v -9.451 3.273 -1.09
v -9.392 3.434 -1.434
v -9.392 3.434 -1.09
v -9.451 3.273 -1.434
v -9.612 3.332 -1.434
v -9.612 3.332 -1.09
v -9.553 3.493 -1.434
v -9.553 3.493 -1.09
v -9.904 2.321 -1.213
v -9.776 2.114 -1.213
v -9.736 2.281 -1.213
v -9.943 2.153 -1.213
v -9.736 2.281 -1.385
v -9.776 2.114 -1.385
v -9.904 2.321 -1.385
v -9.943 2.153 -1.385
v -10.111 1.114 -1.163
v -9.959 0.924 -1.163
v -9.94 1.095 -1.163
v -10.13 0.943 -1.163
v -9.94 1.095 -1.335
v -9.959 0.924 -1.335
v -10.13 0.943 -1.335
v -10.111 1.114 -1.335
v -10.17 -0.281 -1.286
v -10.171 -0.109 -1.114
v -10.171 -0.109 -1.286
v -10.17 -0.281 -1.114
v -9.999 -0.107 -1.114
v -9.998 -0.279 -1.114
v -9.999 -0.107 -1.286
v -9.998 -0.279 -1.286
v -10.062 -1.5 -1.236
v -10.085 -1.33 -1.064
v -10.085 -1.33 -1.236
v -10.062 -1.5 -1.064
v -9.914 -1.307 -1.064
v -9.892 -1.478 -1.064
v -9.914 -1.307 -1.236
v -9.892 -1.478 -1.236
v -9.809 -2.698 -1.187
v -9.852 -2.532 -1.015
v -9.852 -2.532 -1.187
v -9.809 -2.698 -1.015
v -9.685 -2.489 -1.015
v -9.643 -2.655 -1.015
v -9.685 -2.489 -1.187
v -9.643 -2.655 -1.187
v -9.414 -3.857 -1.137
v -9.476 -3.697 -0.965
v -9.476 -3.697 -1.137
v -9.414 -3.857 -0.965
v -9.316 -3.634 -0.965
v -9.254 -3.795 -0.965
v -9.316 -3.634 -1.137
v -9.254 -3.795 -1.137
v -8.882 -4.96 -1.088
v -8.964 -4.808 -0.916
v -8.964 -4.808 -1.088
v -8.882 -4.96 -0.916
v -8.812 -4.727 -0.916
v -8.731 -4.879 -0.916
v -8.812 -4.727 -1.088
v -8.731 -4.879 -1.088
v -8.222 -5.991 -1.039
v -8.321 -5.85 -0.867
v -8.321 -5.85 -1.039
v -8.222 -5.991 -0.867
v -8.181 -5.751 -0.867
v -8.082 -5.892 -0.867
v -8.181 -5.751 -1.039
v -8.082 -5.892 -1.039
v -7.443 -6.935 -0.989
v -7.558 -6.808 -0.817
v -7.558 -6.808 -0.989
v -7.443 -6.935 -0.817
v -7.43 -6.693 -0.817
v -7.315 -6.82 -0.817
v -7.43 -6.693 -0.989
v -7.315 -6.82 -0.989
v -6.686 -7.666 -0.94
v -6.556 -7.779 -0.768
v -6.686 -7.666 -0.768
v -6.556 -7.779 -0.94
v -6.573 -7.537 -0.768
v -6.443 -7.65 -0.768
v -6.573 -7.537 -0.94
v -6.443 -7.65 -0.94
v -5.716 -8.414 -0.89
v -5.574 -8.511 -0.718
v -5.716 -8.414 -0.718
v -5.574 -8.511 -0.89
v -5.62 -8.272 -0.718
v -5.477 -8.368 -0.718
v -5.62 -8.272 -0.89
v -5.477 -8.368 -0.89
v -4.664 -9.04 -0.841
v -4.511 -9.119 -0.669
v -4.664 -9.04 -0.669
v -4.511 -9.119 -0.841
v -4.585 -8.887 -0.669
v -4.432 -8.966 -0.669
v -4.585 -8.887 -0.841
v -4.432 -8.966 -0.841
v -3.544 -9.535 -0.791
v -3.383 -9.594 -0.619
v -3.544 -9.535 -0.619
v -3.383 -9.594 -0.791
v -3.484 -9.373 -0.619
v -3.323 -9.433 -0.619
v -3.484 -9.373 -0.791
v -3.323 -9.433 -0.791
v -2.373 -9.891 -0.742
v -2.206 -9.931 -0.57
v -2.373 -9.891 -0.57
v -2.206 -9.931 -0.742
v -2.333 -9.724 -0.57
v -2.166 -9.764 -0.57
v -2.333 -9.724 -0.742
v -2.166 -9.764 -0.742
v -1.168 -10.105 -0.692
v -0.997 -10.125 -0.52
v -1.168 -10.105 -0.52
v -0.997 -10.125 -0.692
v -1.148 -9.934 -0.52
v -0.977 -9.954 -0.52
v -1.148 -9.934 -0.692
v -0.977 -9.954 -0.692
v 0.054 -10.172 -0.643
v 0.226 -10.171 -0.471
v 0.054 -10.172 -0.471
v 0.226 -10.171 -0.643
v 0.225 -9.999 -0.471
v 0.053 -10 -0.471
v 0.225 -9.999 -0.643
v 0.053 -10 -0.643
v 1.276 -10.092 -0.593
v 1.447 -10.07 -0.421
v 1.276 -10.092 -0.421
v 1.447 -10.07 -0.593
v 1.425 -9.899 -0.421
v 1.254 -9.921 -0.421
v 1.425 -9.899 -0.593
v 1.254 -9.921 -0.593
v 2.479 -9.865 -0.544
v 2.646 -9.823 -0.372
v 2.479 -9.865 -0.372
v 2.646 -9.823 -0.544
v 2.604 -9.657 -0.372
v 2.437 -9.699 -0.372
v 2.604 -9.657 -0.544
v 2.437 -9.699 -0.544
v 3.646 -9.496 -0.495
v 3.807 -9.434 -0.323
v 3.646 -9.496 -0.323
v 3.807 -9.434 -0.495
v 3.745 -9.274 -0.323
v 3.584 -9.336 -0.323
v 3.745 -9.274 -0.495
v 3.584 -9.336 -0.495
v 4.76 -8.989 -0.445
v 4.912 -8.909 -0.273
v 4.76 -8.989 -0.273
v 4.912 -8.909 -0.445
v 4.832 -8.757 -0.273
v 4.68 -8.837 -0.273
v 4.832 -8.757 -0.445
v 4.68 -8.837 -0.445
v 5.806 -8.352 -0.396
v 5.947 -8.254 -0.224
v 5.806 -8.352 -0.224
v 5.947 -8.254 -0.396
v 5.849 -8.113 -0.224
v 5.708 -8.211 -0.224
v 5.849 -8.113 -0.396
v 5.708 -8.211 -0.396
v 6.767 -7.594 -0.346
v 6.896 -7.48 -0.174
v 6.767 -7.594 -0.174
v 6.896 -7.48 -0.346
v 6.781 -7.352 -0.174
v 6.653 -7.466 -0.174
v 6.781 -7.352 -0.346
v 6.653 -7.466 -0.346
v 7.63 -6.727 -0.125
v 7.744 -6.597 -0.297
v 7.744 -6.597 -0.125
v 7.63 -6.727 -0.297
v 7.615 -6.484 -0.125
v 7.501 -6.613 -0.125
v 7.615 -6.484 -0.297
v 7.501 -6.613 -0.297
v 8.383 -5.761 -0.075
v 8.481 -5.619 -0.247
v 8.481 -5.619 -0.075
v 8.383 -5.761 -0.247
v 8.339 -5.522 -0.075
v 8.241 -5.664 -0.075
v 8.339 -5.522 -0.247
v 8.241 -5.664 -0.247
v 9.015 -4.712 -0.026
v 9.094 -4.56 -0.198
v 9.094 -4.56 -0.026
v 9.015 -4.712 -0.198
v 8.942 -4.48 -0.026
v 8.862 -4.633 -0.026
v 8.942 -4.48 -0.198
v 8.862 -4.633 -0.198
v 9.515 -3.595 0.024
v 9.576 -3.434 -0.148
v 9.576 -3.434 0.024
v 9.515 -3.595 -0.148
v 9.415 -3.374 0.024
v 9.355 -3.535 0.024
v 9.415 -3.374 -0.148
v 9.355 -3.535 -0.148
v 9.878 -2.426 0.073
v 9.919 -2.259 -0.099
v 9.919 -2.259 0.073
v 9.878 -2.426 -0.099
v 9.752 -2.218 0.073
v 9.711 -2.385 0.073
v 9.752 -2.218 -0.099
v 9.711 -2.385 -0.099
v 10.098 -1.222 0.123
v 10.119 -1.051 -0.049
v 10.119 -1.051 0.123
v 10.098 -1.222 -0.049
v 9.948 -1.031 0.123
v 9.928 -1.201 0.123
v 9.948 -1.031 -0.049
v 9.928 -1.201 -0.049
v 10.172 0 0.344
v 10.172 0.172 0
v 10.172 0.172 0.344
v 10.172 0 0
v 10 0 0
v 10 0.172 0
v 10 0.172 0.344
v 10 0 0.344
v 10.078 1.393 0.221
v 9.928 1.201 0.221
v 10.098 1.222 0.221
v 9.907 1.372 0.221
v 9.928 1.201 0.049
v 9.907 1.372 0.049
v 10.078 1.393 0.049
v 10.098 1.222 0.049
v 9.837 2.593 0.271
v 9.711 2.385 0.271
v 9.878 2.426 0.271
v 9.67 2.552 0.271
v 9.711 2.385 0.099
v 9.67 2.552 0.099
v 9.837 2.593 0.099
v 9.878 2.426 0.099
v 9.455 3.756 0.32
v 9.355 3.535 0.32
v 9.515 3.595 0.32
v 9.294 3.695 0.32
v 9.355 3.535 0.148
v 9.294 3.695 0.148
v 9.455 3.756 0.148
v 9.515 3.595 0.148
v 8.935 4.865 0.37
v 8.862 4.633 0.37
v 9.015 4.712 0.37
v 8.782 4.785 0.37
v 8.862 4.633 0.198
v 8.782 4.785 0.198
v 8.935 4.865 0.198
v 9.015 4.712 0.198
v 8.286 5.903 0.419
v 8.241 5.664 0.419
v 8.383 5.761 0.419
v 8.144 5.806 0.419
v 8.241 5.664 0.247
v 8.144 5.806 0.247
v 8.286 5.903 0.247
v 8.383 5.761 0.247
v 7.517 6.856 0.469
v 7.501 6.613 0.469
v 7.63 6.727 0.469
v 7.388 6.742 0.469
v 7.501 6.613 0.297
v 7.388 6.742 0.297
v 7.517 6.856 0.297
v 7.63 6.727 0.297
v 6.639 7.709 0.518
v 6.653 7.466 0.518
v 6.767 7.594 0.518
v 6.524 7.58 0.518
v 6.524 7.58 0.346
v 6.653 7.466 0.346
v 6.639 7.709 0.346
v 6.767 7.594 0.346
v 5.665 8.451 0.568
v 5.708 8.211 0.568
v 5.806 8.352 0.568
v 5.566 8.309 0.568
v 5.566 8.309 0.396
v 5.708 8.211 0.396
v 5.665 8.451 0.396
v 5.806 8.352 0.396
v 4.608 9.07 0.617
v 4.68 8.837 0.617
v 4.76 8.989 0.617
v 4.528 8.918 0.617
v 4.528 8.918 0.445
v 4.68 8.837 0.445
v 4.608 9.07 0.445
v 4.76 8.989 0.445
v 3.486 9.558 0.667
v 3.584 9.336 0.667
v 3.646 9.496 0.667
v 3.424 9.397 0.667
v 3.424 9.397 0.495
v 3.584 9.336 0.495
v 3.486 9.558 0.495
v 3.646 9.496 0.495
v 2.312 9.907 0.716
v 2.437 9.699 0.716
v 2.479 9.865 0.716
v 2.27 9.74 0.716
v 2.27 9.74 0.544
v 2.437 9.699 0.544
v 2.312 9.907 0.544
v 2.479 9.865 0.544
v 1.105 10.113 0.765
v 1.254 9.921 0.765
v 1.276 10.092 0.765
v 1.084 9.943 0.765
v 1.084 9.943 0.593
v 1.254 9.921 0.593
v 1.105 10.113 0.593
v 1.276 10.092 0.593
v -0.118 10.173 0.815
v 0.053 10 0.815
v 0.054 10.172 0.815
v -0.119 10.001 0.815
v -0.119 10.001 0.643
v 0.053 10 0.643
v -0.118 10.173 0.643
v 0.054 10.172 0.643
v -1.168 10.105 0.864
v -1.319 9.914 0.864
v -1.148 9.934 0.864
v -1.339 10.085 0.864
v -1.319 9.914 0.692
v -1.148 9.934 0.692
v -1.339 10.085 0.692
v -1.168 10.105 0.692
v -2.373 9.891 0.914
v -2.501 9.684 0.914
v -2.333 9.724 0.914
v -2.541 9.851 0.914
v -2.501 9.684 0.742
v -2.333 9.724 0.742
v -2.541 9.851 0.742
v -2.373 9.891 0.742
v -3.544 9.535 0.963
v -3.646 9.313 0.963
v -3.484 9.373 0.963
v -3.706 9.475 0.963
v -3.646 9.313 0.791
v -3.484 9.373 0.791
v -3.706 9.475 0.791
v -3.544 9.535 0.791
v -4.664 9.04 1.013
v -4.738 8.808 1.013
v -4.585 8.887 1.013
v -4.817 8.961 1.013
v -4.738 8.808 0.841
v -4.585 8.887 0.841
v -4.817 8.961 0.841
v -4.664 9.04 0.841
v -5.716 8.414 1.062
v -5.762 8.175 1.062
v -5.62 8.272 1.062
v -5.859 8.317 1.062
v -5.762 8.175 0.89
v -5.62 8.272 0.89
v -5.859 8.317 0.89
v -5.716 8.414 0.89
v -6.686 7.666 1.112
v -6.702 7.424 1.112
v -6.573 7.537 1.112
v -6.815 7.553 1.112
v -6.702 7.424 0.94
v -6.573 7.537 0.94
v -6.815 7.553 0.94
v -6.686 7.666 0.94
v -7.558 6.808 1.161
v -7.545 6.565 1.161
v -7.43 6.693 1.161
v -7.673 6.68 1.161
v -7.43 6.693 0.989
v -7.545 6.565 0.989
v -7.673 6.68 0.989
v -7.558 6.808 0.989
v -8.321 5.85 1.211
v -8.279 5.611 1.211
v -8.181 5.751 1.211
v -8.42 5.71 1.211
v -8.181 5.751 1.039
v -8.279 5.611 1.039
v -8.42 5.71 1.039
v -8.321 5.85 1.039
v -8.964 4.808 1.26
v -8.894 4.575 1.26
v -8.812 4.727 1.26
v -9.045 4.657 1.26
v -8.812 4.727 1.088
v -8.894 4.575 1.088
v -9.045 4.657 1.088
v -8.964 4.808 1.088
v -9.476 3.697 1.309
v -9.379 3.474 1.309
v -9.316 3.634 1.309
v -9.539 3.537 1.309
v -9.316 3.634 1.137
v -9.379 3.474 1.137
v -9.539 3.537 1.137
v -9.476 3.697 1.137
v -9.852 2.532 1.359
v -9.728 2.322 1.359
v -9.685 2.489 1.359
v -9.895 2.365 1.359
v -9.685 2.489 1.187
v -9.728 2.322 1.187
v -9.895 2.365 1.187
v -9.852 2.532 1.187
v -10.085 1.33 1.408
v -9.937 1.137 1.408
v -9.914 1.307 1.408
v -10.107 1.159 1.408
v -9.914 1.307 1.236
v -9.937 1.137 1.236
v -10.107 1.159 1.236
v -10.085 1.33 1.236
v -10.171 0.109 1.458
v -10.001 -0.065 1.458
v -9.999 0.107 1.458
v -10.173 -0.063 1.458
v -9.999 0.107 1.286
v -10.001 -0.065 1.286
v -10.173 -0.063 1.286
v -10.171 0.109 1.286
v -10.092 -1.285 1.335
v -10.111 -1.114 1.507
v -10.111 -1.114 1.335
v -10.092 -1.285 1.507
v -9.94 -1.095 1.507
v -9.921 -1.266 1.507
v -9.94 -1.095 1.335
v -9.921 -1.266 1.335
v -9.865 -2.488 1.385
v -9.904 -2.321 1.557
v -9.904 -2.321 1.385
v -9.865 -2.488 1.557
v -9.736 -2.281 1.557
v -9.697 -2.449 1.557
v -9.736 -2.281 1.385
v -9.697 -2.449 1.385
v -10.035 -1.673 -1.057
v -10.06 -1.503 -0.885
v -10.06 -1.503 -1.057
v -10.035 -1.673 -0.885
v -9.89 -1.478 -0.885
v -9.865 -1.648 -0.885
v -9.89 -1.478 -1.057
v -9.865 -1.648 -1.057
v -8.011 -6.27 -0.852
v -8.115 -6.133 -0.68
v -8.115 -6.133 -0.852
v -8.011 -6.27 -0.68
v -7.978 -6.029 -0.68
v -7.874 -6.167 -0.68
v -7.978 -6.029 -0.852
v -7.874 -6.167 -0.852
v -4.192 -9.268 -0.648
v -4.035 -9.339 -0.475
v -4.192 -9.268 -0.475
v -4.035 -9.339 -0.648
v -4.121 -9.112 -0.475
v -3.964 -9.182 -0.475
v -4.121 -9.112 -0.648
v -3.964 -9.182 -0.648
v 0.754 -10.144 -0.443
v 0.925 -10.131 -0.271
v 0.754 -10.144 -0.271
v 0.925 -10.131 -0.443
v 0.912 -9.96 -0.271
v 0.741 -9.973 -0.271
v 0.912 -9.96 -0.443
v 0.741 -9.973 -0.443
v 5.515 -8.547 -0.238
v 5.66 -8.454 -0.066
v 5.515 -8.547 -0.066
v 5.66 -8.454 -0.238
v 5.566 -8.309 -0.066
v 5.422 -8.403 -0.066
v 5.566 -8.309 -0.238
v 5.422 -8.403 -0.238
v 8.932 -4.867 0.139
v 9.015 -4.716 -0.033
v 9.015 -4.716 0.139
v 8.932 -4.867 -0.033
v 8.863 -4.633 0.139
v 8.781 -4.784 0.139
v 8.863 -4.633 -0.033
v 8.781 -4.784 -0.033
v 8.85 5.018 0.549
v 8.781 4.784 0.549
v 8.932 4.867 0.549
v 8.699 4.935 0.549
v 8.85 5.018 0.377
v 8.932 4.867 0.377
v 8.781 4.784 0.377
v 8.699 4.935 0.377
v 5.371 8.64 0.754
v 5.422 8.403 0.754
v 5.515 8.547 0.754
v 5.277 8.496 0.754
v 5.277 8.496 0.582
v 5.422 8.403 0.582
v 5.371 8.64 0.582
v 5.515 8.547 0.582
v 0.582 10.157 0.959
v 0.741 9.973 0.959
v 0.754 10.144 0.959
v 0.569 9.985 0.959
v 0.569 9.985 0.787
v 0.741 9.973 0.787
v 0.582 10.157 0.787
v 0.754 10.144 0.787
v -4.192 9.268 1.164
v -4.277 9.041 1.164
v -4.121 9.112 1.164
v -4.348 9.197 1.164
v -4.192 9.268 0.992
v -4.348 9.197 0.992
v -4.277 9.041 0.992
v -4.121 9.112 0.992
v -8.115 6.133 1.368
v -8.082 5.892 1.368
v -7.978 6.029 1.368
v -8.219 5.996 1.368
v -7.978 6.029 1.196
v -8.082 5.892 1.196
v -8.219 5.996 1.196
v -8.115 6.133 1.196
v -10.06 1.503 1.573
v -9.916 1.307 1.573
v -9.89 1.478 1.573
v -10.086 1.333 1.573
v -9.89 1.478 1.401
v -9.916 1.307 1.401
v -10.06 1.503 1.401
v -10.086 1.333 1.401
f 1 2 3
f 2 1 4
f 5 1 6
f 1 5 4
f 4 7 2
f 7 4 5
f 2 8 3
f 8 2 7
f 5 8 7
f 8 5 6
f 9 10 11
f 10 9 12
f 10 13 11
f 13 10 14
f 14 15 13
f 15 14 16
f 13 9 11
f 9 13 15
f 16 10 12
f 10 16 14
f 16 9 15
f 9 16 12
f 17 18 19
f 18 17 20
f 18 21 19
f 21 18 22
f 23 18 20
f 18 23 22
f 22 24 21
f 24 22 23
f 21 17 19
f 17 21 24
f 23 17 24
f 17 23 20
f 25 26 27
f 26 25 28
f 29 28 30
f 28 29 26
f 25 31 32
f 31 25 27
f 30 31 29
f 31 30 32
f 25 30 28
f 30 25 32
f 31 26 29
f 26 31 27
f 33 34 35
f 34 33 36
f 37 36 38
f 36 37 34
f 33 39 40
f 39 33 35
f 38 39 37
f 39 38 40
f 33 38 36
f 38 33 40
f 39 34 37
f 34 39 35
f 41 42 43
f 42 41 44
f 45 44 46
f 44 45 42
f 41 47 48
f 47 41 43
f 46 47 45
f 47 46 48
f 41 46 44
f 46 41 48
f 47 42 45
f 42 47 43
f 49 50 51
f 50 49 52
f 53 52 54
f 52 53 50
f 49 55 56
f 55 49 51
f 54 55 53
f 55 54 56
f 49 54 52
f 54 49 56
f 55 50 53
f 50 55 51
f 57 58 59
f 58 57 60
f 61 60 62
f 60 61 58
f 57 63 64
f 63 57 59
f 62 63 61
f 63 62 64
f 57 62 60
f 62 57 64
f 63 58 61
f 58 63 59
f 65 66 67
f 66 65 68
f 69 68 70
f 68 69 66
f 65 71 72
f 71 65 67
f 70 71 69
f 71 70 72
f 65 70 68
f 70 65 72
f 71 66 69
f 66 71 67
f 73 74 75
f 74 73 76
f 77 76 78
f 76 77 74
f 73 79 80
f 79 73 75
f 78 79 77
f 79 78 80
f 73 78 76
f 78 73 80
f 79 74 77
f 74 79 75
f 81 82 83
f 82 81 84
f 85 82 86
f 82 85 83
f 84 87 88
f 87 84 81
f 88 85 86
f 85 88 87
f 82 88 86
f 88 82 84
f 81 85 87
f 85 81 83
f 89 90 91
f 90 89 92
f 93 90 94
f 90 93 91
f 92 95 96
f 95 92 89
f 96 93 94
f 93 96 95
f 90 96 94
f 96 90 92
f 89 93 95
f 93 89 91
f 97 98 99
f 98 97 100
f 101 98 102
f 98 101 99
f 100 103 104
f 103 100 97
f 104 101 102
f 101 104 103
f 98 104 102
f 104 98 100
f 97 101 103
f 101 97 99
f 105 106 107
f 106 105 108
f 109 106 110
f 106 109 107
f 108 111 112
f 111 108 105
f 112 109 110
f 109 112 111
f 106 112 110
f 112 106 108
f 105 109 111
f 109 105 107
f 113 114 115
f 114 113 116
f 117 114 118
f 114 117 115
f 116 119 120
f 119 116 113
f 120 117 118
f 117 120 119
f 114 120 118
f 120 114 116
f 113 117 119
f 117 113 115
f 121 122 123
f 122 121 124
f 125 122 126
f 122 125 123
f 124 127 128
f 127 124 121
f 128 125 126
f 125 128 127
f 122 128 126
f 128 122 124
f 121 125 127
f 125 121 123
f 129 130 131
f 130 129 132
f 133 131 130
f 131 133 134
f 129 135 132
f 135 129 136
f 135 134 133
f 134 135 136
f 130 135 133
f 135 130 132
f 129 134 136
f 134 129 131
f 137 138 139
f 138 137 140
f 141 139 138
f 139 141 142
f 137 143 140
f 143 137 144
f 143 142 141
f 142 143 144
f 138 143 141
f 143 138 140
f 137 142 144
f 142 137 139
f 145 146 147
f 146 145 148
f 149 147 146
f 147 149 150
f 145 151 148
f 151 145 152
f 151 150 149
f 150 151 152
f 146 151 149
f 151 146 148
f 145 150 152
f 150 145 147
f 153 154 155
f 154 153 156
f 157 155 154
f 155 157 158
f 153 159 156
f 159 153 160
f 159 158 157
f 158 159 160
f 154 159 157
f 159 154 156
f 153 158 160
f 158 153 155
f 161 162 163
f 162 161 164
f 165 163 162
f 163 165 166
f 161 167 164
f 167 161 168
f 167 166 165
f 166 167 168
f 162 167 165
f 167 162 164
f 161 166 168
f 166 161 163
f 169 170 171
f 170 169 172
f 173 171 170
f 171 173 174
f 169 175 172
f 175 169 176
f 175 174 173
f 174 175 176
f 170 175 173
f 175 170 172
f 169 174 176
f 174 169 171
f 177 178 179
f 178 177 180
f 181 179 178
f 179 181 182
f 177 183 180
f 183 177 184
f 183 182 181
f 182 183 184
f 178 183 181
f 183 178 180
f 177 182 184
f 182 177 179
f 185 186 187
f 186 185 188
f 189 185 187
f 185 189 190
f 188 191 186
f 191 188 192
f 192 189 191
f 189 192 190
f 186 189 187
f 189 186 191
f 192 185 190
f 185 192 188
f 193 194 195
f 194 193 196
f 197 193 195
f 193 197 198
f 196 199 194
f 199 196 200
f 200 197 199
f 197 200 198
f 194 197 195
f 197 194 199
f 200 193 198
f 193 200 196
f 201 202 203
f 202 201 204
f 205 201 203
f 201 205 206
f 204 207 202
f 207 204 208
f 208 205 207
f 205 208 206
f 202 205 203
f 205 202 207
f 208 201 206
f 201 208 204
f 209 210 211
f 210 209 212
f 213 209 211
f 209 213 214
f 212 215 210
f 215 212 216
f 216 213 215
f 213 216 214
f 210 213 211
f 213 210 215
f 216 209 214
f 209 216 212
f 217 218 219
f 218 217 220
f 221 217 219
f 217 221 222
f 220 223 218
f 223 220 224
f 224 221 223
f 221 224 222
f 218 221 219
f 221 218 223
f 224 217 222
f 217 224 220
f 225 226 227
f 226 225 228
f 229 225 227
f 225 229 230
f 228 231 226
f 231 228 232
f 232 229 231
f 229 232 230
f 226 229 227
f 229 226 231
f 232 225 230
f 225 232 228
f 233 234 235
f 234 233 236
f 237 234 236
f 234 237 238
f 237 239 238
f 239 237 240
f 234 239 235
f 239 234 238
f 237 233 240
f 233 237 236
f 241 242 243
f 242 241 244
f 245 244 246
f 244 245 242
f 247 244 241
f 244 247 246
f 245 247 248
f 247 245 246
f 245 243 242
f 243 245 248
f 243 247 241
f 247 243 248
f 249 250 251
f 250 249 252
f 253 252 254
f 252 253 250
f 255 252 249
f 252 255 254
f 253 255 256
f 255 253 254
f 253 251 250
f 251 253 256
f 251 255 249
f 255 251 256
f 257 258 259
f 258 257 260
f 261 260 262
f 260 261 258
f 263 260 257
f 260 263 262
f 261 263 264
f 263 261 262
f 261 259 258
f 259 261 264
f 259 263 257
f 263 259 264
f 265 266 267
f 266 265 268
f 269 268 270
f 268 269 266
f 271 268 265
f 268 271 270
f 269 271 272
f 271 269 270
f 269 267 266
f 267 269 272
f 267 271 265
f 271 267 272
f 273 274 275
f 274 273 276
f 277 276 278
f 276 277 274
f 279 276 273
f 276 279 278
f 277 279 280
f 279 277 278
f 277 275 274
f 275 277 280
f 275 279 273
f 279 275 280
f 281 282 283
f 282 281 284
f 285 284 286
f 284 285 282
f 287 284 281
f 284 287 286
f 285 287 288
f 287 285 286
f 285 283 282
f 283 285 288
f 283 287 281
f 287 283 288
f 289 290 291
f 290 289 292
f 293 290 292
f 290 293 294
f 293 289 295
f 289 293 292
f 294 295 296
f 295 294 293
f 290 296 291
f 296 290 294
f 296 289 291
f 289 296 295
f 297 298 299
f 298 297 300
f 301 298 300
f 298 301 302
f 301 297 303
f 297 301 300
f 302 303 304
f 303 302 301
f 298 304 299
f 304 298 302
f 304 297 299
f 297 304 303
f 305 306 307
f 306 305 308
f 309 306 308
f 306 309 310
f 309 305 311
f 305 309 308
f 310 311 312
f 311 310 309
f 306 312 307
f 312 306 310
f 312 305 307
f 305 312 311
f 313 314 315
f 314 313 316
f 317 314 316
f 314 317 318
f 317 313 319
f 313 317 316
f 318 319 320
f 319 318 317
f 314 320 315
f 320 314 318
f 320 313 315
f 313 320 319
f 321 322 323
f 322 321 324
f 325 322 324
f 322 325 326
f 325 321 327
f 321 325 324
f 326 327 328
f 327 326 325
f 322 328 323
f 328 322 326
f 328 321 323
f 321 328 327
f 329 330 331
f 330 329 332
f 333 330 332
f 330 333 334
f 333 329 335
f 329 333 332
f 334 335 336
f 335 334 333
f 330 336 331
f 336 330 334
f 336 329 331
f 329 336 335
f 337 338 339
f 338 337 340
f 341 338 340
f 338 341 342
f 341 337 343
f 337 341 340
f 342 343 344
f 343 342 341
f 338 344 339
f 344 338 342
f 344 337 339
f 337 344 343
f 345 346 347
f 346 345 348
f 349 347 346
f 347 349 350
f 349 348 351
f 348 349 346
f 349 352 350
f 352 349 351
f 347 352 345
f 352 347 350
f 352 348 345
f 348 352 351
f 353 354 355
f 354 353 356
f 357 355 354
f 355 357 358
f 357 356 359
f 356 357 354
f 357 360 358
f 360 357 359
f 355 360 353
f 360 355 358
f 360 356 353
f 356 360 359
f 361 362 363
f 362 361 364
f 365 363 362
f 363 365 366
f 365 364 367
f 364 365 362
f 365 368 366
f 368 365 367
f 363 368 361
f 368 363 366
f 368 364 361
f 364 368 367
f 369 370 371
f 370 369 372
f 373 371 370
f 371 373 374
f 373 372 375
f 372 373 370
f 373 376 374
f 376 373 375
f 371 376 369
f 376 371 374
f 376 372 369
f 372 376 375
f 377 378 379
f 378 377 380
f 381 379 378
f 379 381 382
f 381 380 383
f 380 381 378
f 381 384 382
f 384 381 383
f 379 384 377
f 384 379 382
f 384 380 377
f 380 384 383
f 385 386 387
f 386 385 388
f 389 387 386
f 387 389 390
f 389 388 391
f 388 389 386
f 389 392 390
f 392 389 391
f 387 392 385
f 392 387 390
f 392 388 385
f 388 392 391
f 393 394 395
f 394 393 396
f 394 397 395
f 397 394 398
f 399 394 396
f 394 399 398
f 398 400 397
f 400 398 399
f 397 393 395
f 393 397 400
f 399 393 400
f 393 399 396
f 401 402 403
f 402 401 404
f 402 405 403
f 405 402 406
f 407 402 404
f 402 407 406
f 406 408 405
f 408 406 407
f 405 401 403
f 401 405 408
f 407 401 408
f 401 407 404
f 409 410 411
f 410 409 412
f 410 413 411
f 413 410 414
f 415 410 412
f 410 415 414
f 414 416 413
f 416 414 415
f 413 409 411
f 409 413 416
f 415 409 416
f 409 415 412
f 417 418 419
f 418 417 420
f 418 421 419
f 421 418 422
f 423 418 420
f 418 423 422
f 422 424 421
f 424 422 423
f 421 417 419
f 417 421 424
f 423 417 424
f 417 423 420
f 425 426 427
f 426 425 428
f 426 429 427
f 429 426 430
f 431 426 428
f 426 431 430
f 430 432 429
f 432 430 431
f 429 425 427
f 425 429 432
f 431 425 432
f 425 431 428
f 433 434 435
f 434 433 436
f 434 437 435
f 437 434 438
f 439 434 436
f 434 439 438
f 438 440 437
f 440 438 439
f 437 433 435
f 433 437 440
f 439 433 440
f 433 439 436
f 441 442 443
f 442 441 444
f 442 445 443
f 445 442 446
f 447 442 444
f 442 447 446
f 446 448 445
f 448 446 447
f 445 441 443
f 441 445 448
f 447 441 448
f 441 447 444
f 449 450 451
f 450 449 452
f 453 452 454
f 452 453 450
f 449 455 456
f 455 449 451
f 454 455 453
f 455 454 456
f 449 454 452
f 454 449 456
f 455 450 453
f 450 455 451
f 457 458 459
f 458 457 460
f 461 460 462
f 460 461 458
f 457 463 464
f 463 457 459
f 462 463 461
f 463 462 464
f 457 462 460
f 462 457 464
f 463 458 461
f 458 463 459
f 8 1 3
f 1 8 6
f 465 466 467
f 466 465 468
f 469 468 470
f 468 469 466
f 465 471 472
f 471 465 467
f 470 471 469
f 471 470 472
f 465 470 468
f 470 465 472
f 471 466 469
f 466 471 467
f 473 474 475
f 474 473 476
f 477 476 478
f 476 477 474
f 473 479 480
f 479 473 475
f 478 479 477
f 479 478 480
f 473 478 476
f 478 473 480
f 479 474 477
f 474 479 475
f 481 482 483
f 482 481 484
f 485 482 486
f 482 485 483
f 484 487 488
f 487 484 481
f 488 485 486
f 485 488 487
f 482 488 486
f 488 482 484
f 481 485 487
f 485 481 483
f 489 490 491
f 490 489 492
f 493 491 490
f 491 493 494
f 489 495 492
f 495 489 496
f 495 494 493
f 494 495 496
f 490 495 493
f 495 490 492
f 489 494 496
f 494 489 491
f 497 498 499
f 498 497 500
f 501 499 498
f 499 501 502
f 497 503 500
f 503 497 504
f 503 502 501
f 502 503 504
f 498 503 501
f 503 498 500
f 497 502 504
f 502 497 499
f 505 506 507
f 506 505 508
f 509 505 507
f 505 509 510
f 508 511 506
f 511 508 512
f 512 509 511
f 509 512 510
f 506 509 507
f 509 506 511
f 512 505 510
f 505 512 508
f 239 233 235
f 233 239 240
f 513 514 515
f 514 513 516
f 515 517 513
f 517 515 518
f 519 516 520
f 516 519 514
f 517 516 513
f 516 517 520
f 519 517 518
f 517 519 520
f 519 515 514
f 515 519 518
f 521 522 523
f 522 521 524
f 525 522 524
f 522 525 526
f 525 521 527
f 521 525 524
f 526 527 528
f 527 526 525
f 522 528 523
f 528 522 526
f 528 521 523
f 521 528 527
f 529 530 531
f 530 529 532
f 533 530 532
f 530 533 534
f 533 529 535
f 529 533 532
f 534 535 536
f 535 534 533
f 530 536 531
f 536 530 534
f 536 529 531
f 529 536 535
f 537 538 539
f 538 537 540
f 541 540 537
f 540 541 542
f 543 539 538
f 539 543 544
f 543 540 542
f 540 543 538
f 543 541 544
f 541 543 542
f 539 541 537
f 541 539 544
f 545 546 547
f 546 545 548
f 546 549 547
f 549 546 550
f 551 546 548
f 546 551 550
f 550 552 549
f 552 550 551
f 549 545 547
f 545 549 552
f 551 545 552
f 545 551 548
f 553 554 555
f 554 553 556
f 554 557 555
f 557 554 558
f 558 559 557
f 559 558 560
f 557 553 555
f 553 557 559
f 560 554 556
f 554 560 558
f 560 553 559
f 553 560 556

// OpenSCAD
// number of days
//
n = 400;

// The mean tropical year on January 1, 2000
//
mty = 365.2421897;

// radius and diameter
r = 10;
d = r * 2;

// one day, in angular units (fraction of a circle, e.g. 360 degrees = 1)
//
od_iau = 1 / mty;

// one day, in (undefined) linear units
//
od_ilu = PI * d * od_iau;

pitch = 15 * od_ilu;

thread_spacing = od_ilu;

module cube_on_helical_path( i, thread, color_arg )
{
  // day i, in angular units (fraction of a circle, e.g. 360 degrees = 1)

  di_iau = i * od_iau;

  z = thread_spacing * thread + di_iau * pitch;

  rotate([ 0, 0, di_iau * 360 ])
    {
      translate([ r, 0, z ])
        {
          color( color_arg ) cube( od_ilu );
        }
    }
}

module example002()
{
  start = floor( -n/2 );
  stop = floor( n/2 );

  sh_start = floor( start / 7 );
  sh_stop = floor( stop / 7 );

  r_ch_start = floor( start / 29 );
  r_ch_stop = floor( stop / 29 );

  union()
  {
    for (i=[sh_start : sh_stop])
      {
        cube_on_helical_path( i*7, 0, "red" );
      }
    for (i=[r_ch_start : r_ch_stop])
      {
        cube_on_helical_path( i*29, 1, "blue" );
      }
  }
}

example002();
